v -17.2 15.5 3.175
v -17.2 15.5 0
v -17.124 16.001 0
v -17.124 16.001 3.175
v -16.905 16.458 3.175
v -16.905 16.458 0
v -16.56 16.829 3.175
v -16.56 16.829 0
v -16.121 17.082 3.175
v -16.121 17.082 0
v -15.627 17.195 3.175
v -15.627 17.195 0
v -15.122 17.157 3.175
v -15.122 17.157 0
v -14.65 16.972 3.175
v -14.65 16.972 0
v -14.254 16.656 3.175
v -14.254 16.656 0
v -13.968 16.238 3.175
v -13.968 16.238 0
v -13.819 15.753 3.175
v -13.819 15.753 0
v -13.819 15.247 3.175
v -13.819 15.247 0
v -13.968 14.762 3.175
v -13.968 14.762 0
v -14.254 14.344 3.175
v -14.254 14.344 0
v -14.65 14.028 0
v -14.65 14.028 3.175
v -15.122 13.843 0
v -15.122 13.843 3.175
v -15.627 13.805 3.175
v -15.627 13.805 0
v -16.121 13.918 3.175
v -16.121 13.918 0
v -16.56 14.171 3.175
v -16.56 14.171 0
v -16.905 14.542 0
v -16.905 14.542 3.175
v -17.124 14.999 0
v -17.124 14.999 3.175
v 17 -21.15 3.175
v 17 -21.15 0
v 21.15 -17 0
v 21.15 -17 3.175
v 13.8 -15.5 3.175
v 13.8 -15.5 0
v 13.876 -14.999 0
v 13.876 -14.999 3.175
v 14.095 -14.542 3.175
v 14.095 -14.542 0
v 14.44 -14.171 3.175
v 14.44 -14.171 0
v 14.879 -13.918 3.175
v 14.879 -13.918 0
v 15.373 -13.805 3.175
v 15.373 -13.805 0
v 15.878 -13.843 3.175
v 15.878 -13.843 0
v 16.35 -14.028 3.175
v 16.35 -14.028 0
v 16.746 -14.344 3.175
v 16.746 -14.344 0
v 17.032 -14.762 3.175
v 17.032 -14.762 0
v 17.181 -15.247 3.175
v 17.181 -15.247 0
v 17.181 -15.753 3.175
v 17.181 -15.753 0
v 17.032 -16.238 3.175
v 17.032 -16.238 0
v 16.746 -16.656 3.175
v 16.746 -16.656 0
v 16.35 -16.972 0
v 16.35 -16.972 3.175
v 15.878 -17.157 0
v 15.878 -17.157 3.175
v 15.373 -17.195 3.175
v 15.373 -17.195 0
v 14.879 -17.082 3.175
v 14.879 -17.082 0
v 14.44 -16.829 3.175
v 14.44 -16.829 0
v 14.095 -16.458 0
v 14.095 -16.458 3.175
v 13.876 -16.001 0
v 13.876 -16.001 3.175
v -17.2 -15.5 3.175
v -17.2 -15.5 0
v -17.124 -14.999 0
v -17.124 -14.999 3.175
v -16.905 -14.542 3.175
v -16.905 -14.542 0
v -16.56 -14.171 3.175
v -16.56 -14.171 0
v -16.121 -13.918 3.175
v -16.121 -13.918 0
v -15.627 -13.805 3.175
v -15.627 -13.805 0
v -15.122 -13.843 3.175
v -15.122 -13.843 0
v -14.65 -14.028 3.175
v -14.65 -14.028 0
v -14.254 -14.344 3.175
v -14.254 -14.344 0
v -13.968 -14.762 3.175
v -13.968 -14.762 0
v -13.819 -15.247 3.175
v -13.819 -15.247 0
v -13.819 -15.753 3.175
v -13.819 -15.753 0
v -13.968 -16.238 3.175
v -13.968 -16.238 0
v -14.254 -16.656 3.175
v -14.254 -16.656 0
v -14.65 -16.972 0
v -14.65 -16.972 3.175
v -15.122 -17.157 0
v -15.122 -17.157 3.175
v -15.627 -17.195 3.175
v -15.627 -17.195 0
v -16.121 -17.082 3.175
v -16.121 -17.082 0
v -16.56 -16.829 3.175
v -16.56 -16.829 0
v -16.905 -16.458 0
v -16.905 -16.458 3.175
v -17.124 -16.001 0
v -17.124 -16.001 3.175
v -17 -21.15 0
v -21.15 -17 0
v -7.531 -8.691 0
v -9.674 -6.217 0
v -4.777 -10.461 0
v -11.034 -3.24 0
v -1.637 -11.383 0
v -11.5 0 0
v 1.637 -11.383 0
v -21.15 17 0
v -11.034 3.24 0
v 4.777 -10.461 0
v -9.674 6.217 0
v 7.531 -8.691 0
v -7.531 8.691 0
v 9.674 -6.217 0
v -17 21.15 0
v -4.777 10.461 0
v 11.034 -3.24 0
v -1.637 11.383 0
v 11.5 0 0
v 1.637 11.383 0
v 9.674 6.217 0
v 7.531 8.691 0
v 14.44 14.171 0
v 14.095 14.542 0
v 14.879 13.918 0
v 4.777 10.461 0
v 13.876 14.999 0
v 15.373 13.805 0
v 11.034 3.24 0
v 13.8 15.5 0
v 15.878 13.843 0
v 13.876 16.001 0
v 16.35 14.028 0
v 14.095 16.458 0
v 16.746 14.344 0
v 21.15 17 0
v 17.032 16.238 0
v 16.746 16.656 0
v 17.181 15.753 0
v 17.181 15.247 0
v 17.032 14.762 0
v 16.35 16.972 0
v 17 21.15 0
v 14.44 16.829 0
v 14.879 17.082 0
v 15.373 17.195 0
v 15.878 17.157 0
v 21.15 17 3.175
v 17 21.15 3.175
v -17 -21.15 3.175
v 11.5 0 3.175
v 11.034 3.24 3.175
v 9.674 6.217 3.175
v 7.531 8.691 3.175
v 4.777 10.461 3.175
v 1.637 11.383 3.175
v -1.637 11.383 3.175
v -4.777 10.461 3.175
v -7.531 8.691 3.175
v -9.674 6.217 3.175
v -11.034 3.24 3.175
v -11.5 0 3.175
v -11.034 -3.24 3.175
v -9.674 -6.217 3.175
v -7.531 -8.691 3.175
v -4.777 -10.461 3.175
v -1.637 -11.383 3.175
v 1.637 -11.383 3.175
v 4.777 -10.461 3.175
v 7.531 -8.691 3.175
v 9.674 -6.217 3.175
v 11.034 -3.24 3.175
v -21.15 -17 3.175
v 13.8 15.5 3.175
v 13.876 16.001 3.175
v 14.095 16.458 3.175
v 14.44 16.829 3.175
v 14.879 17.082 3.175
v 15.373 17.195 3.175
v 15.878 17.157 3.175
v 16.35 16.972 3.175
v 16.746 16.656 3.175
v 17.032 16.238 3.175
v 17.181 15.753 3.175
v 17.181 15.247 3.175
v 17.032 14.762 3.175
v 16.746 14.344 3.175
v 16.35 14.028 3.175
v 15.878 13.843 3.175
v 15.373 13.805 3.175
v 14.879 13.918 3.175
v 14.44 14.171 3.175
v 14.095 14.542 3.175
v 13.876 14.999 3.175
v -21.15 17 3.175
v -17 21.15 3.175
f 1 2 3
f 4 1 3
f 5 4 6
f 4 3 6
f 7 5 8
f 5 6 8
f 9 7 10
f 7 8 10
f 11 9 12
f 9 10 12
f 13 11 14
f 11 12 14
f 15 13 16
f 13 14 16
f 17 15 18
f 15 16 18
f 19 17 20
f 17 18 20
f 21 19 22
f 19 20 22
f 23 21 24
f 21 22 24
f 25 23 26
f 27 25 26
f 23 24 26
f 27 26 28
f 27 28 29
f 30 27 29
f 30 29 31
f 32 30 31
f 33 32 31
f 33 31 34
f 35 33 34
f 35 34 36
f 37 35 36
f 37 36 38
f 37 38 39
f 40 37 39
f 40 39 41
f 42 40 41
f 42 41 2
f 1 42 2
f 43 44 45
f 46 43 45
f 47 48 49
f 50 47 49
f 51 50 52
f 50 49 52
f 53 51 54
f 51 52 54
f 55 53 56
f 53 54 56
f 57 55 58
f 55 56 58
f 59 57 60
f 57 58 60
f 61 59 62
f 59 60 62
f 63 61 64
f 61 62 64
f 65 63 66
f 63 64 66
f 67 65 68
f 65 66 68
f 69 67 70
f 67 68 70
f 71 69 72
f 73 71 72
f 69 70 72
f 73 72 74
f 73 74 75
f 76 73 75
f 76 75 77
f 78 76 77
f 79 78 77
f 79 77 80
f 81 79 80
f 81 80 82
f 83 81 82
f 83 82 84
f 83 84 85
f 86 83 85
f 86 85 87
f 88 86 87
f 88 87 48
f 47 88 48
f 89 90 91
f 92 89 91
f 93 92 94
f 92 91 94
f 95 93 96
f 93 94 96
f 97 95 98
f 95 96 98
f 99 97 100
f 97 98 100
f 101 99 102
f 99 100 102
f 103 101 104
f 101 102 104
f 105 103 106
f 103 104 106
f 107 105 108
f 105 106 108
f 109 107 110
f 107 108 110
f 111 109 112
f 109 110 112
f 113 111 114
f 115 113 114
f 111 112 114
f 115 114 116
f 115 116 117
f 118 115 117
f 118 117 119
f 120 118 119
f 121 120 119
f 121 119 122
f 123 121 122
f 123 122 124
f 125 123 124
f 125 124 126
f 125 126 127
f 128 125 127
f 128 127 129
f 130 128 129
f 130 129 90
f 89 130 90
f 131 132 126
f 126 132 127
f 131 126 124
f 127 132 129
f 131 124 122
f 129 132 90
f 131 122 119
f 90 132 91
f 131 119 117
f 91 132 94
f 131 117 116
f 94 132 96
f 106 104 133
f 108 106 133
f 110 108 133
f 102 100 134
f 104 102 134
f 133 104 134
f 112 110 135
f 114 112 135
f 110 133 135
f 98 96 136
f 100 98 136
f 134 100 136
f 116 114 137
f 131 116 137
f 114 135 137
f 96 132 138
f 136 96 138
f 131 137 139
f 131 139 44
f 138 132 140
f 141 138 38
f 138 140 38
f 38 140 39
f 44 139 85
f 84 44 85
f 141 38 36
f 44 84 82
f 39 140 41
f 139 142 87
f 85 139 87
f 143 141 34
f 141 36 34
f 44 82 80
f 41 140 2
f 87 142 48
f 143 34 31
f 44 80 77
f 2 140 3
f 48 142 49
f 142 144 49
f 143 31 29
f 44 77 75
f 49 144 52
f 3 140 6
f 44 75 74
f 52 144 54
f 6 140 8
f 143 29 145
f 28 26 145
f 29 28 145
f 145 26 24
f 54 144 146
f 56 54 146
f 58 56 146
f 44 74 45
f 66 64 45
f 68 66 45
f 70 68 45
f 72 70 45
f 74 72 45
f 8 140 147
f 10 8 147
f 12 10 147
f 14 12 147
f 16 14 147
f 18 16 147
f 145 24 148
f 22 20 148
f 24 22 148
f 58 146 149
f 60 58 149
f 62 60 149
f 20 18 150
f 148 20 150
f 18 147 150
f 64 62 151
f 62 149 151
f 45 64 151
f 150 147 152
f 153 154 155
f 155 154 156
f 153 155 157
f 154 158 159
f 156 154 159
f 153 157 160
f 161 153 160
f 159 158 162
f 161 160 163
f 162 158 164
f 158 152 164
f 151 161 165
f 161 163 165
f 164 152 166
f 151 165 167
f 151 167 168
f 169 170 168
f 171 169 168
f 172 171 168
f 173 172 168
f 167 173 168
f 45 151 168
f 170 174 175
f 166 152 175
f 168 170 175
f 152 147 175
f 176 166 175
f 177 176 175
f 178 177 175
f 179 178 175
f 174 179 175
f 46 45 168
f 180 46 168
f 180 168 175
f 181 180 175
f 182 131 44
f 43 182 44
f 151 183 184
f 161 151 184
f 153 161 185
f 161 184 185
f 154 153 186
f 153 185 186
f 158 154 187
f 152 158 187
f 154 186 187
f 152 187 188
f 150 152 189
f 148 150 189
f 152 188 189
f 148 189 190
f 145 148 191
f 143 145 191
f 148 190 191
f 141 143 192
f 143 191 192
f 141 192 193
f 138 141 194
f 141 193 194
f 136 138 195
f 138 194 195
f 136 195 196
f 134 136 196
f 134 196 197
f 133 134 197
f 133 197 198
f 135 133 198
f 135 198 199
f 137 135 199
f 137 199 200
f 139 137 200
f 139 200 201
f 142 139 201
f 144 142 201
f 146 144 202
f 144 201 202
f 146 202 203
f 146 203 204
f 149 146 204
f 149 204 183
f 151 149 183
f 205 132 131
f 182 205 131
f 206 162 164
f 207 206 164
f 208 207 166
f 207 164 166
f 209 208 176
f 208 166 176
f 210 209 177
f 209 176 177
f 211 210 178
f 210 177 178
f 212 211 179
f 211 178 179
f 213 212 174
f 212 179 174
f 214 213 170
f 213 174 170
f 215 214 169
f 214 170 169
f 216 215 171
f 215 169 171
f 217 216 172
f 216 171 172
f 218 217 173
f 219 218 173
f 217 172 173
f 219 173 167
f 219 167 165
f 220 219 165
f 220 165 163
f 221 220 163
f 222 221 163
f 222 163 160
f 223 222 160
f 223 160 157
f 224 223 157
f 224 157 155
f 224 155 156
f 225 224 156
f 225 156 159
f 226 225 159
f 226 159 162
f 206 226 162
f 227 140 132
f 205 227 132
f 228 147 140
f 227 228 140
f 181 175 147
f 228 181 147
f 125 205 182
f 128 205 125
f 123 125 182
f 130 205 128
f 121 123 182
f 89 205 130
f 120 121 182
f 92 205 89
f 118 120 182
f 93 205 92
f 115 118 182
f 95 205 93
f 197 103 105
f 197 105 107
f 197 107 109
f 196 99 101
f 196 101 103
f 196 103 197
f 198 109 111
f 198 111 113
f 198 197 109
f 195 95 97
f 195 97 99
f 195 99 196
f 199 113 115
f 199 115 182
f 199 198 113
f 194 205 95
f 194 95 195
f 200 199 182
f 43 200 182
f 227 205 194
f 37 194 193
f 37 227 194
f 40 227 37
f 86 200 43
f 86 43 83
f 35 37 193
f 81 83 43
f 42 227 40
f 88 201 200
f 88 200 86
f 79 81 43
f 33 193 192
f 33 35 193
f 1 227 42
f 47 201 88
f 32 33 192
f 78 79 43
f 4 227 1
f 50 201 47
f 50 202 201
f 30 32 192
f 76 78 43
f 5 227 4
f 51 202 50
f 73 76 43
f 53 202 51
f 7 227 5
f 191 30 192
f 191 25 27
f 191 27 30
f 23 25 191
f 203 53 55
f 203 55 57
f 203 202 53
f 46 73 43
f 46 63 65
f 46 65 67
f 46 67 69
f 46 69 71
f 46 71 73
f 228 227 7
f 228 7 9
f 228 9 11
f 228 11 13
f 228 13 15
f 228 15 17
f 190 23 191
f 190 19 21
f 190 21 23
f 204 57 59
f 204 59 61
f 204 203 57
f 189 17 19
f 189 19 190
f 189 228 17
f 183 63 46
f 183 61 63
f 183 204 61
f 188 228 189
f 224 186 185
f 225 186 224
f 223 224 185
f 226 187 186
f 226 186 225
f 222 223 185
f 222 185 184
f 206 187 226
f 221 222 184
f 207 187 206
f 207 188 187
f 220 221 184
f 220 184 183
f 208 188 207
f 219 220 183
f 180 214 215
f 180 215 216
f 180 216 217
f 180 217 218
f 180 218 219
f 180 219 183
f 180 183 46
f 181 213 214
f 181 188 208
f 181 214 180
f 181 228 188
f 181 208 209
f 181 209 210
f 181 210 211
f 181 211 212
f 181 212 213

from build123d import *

# Parameters (mm, degrees)
BOSS_EXTRUDE1_DEPTH      = 3.175
SKETCH2_R                = 11.5
CUT_EXTRUDE1_DEPTH       = 4.175
M3_CLEARANCE_HOLE1_D     = 3.4
M3_CLEARANCE_HOLE1_DEPTH = 3.175


with BuildPart() as part:
    # Sketch1 → Boss-Extrude1 (new body)
    with BuildSketch(Plane.XY):
        Polygon((-17, -21.15), (17, -21.15), (21.15, -17), (21.15, 17), (17, 21.15), (-17, 21.15), (-21.15, 17), (-21.15, -17), align=None)
    extrude(amount=BOSS_EXTRUDE1_DEPTH)

    # Sketch2 → Cut-Extrude1 (cut, through all)
    with BuildSketch(Plane.XY.offset(3.175)):
        Circle(SKETCH2_R)
    extrude(amount=-CUT_EXTRUDE1_DEPTH, mode=Mode.SUBTRACT)

    # M3 Clearance Hole1
    with Locations(Plane.XY.offset(3.175)):
        with Locations((-15.5, 15.5), (15.5, 15.5), (15.5, -15.5), (-15.5, -15.5)):
            Hole(M3_CLEARANCE_HOLE1_D / 2, depth=M3_CLEARANCE_HOLE1_DEPTH)


solid = part.part
